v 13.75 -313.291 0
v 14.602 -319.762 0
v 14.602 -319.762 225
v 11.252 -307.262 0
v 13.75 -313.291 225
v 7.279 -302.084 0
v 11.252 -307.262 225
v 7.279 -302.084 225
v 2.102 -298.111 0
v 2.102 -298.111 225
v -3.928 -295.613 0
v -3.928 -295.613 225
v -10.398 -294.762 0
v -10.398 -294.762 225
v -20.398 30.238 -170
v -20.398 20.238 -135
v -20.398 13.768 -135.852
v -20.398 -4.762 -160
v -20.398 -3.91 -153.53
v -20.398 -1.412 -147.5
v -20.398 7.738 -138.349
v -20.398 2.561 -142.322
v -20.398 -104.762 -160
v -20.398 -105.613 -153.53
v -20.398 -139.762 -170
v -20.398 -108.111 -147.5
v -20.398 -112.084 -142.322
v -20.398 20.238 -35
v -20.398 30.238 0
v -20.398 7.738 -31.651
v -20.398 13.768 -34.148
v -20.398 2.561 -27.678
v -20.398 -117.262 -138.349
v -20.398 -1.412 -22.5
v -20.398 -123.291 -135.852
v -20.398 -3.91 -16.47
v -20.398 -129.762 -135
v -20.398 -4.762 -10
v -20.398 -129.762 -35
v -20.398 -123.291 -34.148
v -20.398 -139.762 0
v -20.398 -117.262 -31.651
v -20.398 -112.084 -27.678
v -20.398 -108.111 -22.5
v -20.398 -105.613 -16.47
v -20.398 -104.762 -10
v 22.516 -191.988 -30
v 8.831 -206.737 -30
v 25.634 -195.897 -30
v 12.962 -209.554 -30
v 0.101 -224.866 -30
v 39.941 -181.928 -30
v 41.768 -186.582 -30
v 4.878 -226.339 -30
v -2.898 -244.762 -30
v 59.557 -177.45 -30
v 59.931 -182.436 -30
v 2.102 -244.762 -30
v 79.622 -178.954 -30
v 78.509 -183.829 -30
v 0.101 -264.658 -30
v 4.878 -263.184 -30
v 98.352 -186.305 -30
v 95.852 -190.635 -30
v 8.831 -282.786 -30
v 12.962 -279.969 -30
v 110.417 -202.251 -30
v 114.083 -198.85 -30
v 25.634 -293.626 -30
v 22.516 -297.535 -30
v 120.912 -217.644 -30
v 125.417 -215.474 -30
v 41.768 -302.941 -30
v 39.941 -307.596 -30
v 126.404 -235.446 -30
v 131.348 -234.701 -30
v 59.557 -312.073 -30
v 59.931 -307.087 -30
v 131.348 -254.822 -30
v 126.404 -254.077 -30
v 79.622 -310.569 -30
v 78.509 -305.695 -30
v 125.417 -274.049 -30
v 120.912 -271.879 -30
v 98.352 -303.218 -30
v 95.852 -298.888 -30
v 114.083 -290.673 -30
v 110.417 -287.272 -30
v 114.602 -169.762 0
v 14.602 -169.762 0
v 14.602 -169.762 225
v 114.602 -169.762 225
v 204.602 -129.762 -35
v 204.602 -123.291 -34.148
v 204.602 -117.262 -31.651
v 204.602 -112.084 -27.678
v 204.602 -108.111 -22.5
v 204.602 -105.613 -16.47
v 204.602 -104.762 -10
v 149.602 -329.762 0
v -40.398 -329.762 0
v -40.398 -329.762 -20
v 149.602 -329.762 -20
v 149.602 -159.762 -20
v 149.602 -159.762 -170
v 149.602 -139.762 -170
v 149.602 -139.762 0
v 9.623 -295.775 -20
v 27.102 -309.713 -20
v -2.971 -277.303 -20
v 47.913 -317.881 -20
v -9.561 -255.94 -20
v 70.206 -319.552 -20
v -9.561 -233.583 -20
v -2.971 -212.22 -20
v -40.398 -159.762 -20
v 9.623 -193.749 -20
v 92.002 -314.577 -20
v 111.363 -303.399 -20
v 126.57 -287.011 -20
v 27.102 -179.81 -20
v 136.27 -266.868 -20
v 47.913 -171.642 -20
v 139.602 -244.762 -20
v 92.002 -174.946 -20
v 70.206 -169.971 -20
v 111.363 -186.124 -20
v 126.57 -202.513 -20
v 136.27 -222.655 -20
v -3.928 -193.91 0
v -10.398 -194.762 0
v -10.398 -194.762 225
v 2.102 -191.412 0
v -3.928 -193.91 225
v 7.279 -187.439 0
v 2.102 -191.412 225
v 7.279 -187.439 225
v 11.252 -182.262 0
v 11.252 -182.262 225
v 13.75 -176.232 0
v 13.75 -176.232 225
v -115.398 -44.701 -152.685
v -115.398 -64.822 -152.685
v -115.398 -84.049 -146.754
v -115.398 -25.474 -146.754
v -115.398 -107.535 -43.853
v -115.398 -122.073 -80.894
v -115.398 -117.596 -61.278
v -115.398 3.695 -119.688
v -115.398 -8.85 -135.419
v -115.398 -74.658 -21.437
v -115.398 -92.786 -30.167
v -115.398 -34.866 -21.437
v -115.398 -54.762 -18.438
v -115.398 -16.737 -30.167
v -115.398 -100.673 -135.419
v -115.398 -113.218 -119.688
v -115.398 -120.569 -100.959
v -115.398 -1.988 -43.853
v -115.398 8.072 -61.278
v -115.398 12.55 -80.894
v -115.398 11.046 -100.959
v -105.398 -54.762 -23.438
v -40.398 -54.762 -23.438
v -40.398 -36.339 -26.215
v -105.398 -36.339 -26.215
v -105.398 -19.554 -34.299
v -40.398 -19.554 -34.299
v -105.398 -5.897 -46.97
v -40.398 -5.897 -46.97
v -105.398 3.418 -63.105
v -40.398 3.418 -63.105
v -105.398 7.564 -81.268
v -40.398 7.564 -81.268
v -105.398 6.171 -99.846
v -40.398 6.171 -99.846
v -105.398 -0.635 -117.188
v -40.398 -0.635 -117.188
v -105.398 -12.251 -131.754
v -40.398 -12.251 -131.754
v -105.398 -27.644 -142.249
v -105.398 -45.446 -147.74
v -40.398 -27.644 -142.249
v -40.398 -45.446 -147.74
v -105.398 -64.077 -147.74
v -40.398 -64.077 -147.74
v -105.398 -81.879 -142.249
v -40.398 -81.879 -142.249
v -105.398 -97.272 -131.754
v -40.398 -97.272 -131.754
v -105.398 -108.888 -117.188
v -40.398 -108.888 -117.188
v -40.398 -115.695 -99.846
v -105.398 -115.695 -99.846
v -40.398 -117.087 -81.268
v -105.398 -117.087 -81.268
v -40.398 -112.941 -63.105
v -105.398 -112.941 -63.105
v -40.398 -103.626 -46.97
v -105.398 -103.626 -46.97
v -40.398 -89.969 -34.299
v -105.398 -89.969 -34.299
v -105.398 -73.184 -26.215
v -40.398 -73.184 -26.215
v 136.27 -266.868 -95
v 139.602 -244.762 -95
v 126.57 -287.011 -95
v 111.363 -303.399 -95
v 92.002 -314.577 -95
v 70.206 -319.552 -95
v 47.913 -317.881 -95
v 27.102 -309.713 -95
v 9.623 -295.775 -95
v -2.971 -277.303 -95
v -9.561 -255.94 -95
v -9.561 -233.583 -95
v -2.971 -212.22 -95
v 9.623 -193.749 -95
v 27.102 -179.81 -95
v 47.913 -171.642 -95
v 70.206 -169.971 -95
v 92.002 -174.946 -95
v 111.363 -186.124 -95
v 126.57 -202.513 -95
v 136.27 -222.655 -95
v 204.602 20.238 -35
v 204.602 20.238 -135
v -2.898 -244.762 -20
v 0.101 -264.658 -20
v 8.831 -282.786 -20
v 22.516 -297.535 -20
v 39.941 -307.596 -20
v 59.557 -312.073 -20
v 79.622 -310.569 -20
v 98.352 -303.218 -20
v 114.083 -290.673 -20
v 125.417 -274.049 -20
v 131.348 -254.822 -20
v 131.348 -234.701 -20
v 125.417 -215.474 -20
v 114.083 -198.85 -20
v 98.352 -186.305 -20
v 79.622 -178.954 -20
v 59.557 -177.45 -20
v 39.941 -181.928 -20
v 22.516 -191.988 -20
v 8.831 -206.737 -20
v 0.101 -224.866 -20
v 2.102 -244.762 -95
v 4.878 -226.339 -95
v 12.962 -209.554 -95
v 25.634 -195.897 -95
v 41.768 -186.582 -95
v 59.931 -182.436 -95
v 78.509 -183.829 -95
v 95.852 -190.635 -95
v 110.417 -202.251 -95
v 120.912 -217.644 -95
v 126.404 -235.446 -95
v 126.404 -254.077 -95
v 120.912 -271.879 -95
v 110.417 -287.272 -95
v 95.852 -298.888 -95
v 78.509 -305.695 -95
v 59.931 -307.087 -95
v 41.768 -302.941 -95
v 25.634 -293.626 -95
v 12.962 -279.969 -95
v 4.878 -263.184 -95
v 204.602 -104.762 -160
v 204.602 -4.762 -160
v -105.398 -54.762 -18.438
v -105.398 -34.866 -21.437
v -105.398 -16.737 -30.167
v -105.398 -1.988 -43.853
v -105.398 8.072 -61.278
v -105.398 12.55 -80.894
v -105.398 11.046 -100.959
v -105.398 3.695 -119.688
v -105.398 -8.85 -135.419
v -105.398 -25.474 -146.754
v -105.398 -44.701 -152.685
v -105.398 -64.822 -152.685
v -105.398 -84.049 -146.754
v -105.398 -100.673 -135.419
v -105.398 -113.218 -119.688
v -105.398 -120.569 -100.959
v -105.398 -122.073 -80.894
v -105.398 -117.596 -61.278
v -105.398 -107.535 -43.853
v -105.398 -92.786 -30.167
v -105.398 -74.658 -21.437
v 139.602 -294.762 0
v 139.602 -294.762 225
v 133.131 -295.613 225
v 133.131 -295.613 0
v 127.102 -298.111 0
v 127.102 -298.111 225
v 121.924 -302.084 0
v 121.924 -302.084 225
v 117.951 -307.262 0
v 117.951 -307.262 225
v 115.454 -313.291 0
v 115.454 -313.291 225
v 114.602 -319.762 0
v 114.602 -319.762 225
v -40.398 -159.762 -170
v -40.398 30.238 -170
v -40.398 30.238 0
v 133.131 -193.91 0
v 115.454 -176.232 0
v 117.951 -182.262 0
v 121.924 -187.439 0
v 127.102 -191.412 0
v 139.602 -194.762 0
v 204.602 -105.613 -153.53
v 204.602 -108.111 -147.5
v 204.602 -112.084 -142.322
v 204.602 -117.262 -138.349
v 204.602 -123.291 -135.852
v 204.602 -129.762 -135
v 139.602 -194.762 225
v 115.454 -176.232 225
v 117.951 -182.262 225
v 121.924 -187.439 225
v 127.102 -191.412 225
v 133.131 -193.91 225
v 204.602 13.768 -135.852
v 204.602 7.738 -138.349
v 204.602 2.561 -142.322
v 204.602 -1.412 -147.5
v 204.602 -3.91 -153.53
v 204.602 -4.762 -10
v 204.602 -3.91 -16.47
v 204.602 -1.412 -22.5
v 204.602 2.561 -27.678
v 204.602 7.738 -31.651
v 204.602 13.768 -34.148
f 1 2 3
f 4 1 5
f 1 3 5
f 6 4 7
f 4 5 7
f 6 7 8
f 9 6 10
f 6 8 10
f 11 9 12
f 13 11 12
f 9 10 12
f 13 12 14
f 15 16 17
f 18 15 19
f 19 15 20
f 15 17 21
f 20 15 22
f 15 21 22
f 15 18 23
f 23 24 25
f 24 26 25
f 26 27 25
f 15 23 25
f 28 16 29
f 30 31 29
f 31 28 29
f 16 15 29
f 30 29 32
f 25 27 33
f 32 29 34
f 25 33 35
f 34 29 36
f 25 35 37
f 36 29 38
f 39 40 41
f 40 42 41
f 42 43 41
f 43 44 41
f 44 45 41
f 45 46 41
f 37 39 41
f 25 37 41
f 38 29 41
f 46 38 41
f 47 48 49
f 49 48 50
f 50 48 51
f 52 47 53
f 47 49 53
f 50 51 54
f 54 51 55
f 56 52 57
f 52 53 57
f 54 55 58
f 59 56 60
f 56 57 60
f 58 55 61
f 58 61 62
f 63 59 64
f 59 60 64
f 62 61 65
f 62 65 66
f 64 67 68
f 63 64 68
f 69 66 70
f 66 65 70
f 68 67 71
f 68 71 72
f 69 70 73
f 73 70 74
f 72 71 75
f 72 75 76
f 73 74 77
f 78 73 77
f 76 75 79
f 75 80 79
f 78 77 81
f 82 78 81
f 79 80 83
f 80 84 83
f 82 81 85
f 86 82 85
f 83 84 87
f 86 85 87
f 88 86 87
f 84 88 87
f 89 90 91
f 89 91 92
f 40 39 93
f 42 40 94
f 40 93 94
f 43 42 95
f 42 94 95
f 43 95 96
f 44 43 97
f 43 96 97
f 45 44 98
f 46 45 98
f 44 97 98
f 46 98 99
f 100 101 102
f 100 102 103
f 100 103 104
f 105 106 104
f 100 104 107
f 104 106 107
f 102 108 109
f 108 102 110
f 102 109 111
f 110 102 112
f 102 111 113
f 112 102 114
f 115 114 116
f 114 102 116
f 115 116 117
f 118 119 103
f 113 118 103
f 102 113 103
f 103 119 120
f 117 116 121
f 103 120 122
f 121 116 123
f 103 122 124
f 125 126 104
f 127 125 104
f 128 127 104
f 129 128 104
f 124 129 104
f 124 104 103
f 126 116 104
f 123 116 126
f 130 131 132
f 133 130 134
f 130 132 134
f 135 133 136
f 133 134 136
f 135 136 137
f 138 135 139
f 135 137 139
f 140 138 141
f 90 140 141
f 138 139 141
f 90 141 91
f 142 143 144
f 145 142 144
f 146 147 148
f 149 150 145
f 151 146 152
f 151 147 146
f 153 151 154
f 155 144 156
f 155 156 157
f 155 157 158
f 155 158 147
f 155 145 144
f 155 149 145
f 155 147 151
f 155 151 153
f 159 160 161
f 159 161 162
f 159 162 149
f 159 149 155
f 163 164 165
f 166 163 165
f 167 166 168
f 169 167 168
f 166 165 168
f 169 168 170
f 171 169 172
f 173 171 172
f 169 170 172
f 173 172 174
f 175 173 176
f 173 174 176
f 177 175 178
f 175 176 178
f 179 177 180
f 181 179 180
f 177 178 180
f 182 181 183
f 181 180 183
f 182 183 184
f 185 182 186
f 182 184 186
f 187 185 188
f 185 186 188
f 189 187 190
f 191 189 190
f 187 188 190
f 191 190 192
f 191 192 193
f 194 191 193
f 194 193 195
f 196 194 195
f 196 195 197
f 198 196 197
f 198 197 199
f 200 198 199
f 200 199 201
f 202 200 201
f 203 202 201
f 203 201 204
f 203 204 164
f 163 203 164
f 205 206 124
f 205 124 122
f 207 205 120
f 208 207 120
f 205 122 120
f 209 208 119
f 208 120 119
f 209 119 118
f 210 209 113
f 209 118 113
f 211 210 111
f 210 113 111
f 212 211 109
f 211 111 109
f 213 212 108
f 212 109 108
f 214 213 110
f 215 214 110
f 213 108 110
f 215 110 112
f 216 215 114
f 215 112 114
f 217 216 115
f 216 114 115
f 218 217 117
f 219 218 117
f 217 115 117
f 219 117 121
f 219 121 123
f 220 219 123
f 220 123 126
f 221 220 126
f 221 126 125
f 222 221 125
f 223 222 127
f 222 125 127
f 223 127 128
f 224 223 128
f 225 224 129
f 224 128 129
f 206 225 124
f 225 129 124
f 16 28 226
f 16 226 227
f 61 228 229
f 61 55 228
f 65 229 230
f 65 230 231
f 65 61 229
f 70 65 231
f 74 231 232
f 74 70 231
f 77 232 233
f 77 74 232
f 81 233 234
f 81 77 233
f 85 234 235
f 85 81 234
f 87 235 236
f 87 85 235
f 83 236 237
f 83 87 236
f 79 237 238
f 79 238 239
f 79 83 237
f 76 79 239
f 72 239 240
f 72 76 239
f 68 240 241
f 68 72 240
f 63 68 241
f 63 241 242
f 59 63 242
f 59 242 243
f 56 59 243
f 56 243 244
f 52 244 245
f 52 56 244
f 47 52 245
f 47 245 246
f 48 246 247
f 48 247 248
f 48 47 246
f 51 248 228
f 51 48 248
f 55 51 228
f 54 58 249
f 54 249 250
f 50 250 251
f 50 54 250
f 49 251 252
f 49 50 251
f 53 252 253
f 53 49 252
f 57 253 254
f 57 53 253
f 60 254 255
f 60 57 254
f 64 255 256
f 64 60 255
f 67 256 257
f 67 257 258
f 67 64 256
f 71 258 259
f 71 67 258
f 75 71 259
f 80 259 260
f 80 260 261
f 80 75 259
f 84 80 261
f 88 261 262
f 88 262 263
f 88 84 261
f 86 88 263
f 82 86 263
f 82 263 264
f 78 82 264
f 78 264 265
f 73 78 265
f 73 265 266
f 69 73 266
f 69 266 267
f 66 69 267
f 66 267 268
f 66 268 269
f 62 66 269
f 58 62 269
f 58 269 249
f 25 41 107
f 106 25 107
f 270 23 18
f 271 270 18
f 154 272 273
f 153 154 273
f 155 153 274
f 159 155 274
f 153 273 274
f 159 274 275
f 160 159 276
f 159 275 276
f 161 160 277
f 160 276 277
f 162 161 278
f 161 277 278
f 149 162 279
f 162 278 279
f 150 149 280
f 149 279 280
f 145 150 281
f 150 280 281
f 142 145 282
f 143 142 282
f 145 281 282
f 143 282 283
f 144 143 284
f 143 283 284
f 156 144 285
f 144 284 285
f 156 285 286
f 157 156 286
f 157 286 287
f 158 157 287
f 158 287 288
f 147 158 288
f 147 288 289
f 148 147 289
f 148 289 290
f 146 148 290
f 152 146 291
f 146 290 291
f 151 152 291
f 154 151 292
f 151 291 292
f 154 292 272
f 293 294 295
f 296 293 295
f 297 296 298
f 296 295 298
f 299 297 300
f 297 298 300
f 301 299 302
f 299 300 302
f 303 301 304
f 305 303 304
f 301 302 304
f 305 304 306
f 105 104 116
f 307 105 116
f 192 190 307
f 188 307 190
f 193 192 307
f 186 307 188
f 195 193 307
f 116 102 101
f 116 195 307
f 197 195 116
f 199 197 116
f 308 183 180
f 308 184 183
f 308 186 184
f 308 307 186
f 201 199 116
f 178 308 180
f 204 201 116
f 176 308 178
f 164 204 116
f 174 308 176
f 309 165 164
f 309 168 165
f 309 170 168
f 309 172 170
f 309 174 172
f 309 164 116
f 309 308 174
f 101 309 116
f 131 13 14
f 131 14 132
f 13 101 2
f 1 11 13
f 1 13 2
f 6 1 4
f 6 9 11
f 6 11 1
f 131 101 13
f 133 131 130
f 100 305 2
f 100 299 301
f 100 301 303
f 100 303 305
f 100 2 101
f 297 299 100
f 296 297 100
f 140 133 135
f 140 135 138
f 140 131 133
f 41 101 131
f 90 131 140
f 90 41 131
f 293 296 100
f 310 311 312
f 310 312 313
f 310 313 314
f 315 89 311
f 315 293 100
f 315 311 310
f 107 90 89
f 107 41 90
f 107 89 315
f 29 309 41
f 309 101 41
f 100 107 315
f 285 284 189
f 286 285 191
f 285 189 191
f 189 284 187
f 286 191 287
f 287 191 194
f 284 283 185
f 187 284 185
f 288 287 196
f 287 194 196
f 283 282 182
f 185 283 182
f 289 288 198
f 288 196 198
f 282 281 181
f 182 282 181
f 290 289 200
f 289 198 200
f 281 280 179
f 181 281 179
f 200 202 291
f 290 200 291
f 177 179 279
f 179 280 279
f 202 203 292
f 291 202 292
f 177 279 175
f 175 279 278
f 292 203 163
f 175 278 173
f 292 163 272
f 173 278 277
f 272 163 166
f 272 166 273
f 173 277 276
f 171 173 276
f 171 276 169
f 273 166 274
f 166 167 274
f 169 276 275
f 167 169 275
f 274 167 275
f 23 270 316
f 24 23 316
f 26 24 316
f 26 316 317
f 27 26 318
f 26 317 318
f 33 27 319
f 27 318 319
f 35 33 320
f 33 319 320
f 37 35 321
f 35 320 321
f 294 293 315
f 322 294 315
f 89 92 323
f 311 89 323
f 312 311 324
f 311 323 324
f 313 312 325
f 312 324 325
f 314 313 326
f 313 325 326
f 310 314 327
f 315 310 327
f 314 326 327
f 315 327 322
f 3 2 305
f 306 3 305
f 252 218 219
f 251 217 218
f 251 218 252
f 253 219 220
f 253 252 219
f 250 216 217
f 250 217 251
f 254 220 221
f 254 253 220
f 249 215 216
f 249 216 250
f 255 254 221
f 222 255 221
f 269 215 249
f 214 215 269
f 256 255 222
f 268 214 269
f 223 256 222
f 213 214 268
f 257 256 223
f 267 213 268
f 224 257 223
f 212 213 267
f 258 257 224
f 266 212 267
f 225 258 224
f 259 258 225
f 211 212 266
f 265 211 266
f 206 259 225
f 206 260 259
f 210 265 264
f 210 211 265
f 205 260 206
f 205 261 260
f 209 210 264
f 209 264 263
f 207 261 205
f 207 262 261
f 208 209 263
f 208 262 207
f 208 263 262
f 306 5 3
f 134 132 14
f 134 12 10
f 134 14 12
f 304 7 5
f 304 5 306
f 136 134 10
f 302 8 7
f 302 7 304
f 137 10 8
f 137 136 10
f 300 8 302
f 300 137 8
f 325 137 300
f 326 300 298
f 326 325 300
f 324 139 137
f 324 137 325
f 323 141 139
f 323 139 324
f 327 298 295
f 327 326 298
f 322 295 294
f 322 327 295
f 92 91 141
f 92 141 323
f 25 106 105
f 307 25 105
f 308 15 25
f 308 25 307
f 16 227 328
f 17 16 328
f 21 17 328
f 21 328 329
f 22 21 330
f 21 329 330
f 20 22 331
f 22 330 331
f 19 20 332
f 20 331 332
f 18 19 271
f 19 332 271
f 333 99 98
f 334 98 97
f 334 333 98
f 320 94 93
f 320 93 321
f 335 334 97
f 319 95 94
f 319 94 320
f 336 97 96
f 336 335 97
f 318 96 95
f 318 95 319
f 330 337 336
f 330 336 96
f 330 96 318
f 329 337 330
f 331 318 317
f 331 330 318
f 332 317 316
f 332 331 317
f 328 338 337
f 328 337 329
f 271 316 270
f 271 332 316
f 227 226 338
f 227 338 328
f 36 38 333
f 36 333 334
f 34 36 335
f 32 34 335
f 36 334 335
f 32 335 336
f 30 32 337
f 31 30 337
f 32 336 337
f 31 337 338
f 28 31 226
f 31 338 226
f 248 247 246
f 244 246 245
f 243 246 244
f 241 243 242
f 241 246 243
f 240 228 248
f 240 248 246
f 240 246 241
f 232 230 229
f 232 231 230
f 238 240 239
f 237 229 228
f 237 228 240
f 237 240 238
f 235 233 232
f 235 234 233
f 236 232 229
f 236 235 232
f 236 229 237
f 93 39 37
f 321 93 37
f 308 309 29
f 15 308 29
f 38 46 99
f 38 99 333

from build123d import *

# Parameters (mm, degrees)
BOSS_EXTRUDE1_DEPTH = 170
SKETCH3_R           = 62.5
BOSS_EXTRUDE2_DEPTH = 75
SKETCH4_W           = 150
SKETCH4_H           = 150
BOSS_EXTRUDE3_DEPTH = 225
CUT_EXTRUDE6_DEPTH  = 225
SKETCH7_W           = 190
SKETCH7_H           = 20
BOSS_EXTRUDE5_DEPTH = 170
SKETCH10_W          = 150
SKETCH10_H          = 150
BOSS_EXTRUDE7_DEPTH = 225
CUT_EXTRUDE7_DEPTH  = 225
SKETCH12_R          = 75
SKETCH12_R_2        = 62.5
BOSS_EXTRUDE8_DEPTH = 75
BOSS_EXTRUDE9_START = -10
SKETCH13_R          = 67.5
SKETCH13_R_2        = 62.5
BOSS_EXTRUDE9_DEPTH = 10
SKETCH14_W          = 10
SKETCH14_H          = 14.038601632


with BuildPart() as part:
    # Sketch2 → Boss-Extrude1 (new body)
    with BuildSketch(Plane.XY):
        Polygon((-40.398264296, 30.238450413), (-20.398264296, 30.238450413), (-20.398264296, -139.761549587), (149.601735704, -139.761549587), (149.601735704, -159.761549587), (-40.398264296, -159.761549587), align=None)
    extrude(amount=-BOSS_EXTRUDE1_DEPTH)

    # Sketch3 → Boss-Extrude2 (add)
    with BuildSketch(Plane.ZY.offset(40.398264296)):
        with Locations((-85.93846623, -54.761549587)):
            Circle(SKETCH3_R)
    extrude(amount=BOSS_EXTRUDE2_DEPTH)

    # Sketch4 → Boss-Extrude3 (add)
    with BuildSketch(Plane(origin=(-20.398264296, 0, 0), x_dir=(0, 0, -1), z_dir=(1, 0, 0))):
        with Locations((85, -54.761549587)):
            Rectangle(SKETCH4_W, SKETCH4_H)
    extrude(amount=BOSS_EXTRUDE3_DEPTH)

    # Sketch5 → Cut-Extrude6 (cut)
    with BuildSketch(Plane(origin=(204.601735704, 0, 0), x_dir=(0, 0, -1), z_dir=(1, 0, 0))):
        with BuildLine():
            Line((35, 20.238450413), (10, 20.238450413))
            Line((10, 20.238450413), (10, -4.761549587))
            ThreePointArc((10, -4.761549587), (27.67766953, 2.560780883), (35, 20.238450413))
        make_face()
        with BuildLine():
            ThreePointArc((35, -129.761549587), (27.67766953, -112.083880057), (10, -104.761549587))
            Line((10, -104.761549587), (10, -129.761549587))
            Line((10, -129.761549587), (35, -129.761549587))
        make_face()
        with BuildLine():
            ThreePointArc((160, -104.761549587), (142.32233047, -112.083880057), (135, -129.761549587))
            Line((135, -129.761549587), (160, -129.761549587))
            Line((160, -129.761549587), (160, -104.761549587))
        make_face()
        with BuildLine():
            Line((160, 20.238450413), (135, 20.238450413))
            ThreePointArc((135, 20.238450413), (142.32233047, 2.560780883), (160, -4.761549587))
            Line((160, -4.761549587), (160, 20.238450413))
        make_face()
    extrude(amount=-CUT_EXTRUDE6_DEPTH, mode=Mode.SUBTRACT)

    # Sketch7 → Boss-Extrude5 (add)
    with BuildSketch(Plane.XZ.offset(159.761549587)):
        with Locations((54.601735704, -10)):
            Rectangle(SKETCH7_W, SKETCH7_H)
    extrude(amount=BOSS_EXTRUDE5_DEPTH)

    # Sketch10 → Boss-Extrude7 (add)
    with BuildSketch(Plane.XY):
        with Locations((64.601735704, -244.761549587)):
            Rectangle(SKETCH10_W, SKETCH10_H)
    extrude(amount=BOSS_EXTRUDE7_DEPTH)

    # Sketch11 → Cut-Extrude7 (cut)
    with BuildSketch(Plane.XY.offset(225)):
        with BuildLine():
            Line((14.601735704, -169.761549587), (-10.398264296, -169.761549587))
            Line((-10.398264296, -169.761549587), (-10.398264296, -194.761549587))
            ThreePointArc((-10.398264296, -194.761549587), (7.279405234, -187.439219117), (14.601735704, -169.761549587))
        make_face()
        with BuildLine():
            Line((139.601735704, -169.761549587), (114.601735704, -169.761549587))
            ThreePointArc((114.601735704, -169.761549587), (121.924066175, -187.439219117), (139.601735704, -194.761549587))
            Line((139.601735704, -194.761549587), (139.601735704, -169.761549587))
        make_face()
        with BuildLine():
            ThreePointArc((139.601735704, -294.761549587), (121.924066175, -302.083880057), (114.601735704, -319.761549587))
            Line((114.601735704, -319.761549587), (139.601735704, -319.761549587))
            Line((139.601735704, -319.761549587), (139.601735704, -294.761549587))
        make_face()
        with BuildLine():
            ThreePointArc((14.601735704, -319.761549587), (7.279405234, -302.083880057), (-10.398264296, -294.761549587))
            Line((-10.398264296, -294.761549587), (-10.398264296, -319.761549587))
            Line((-10.398264296, -319.761549587), (14.601735704, -319.761549587))
        make_face()
    extrude(amount=-CUT_EXTRUDE7_DEPTH, mode=Mode.SUBTRACT)

    # Sketch12 → Boss-Extrude8 (add)
    with BuildSketch(Plane(origin=(0, 0, -20), x_dir=(-1, 0, 0), z_dir=(0, 0, -1))):
        with Locations(Location((-64.601735704, -244.761549587, 0), (0, 0, 180))):
            Circle(SKETCH12_R)
        with Locations((-64.601735704, -244.761549587)):
            Circle(SKETCH12_R_2, mode=Mode.SUBTRACT)
    extrude(amount=BOSS_EXTRUDE8_DEPTH)

    # Sketch13 → Boss-Extrude9 (add)
    with BuildSketch(Plane.ZY.offset(115.398264296).offset(BOSS_EXTRUDE9_START)):
        with Locations((-85.93846623, -54.761549587)):
            Circle(SKETCH13_R)
        with Locations((-85.93846623, -54.761549587)):
            Circle(SKETCH13_R_2, mode=Mode.SUBTRACT)
    extrude(amount=BOSS_EXTRUDE9_DEPTH)

    # Sketch14 → Cut-Revolve1 (revolve, cut)
    with BuildSketch(Plane(origin=(64.601735704, 0, 0), x_dir=(0, 0, -1), z_dir=(1, 0, 0)), mode=Mode.PRIVATE) as cut_revolve1_sk:
        with Locations((25, -184.280850403)):
            Rectangle(SKETCH14_W, SKETCH14_H)
    revolve(cut_revolve1_sk.sketch.rotate(Axis((64.601735704, -244.761549587, -95), (0, 0, 1)), 90), axis=Axis((64.601735704, -244.761549587, -95), (0, 0, 1)), mode=Mode.SUBTRACT)


solid = part.part
